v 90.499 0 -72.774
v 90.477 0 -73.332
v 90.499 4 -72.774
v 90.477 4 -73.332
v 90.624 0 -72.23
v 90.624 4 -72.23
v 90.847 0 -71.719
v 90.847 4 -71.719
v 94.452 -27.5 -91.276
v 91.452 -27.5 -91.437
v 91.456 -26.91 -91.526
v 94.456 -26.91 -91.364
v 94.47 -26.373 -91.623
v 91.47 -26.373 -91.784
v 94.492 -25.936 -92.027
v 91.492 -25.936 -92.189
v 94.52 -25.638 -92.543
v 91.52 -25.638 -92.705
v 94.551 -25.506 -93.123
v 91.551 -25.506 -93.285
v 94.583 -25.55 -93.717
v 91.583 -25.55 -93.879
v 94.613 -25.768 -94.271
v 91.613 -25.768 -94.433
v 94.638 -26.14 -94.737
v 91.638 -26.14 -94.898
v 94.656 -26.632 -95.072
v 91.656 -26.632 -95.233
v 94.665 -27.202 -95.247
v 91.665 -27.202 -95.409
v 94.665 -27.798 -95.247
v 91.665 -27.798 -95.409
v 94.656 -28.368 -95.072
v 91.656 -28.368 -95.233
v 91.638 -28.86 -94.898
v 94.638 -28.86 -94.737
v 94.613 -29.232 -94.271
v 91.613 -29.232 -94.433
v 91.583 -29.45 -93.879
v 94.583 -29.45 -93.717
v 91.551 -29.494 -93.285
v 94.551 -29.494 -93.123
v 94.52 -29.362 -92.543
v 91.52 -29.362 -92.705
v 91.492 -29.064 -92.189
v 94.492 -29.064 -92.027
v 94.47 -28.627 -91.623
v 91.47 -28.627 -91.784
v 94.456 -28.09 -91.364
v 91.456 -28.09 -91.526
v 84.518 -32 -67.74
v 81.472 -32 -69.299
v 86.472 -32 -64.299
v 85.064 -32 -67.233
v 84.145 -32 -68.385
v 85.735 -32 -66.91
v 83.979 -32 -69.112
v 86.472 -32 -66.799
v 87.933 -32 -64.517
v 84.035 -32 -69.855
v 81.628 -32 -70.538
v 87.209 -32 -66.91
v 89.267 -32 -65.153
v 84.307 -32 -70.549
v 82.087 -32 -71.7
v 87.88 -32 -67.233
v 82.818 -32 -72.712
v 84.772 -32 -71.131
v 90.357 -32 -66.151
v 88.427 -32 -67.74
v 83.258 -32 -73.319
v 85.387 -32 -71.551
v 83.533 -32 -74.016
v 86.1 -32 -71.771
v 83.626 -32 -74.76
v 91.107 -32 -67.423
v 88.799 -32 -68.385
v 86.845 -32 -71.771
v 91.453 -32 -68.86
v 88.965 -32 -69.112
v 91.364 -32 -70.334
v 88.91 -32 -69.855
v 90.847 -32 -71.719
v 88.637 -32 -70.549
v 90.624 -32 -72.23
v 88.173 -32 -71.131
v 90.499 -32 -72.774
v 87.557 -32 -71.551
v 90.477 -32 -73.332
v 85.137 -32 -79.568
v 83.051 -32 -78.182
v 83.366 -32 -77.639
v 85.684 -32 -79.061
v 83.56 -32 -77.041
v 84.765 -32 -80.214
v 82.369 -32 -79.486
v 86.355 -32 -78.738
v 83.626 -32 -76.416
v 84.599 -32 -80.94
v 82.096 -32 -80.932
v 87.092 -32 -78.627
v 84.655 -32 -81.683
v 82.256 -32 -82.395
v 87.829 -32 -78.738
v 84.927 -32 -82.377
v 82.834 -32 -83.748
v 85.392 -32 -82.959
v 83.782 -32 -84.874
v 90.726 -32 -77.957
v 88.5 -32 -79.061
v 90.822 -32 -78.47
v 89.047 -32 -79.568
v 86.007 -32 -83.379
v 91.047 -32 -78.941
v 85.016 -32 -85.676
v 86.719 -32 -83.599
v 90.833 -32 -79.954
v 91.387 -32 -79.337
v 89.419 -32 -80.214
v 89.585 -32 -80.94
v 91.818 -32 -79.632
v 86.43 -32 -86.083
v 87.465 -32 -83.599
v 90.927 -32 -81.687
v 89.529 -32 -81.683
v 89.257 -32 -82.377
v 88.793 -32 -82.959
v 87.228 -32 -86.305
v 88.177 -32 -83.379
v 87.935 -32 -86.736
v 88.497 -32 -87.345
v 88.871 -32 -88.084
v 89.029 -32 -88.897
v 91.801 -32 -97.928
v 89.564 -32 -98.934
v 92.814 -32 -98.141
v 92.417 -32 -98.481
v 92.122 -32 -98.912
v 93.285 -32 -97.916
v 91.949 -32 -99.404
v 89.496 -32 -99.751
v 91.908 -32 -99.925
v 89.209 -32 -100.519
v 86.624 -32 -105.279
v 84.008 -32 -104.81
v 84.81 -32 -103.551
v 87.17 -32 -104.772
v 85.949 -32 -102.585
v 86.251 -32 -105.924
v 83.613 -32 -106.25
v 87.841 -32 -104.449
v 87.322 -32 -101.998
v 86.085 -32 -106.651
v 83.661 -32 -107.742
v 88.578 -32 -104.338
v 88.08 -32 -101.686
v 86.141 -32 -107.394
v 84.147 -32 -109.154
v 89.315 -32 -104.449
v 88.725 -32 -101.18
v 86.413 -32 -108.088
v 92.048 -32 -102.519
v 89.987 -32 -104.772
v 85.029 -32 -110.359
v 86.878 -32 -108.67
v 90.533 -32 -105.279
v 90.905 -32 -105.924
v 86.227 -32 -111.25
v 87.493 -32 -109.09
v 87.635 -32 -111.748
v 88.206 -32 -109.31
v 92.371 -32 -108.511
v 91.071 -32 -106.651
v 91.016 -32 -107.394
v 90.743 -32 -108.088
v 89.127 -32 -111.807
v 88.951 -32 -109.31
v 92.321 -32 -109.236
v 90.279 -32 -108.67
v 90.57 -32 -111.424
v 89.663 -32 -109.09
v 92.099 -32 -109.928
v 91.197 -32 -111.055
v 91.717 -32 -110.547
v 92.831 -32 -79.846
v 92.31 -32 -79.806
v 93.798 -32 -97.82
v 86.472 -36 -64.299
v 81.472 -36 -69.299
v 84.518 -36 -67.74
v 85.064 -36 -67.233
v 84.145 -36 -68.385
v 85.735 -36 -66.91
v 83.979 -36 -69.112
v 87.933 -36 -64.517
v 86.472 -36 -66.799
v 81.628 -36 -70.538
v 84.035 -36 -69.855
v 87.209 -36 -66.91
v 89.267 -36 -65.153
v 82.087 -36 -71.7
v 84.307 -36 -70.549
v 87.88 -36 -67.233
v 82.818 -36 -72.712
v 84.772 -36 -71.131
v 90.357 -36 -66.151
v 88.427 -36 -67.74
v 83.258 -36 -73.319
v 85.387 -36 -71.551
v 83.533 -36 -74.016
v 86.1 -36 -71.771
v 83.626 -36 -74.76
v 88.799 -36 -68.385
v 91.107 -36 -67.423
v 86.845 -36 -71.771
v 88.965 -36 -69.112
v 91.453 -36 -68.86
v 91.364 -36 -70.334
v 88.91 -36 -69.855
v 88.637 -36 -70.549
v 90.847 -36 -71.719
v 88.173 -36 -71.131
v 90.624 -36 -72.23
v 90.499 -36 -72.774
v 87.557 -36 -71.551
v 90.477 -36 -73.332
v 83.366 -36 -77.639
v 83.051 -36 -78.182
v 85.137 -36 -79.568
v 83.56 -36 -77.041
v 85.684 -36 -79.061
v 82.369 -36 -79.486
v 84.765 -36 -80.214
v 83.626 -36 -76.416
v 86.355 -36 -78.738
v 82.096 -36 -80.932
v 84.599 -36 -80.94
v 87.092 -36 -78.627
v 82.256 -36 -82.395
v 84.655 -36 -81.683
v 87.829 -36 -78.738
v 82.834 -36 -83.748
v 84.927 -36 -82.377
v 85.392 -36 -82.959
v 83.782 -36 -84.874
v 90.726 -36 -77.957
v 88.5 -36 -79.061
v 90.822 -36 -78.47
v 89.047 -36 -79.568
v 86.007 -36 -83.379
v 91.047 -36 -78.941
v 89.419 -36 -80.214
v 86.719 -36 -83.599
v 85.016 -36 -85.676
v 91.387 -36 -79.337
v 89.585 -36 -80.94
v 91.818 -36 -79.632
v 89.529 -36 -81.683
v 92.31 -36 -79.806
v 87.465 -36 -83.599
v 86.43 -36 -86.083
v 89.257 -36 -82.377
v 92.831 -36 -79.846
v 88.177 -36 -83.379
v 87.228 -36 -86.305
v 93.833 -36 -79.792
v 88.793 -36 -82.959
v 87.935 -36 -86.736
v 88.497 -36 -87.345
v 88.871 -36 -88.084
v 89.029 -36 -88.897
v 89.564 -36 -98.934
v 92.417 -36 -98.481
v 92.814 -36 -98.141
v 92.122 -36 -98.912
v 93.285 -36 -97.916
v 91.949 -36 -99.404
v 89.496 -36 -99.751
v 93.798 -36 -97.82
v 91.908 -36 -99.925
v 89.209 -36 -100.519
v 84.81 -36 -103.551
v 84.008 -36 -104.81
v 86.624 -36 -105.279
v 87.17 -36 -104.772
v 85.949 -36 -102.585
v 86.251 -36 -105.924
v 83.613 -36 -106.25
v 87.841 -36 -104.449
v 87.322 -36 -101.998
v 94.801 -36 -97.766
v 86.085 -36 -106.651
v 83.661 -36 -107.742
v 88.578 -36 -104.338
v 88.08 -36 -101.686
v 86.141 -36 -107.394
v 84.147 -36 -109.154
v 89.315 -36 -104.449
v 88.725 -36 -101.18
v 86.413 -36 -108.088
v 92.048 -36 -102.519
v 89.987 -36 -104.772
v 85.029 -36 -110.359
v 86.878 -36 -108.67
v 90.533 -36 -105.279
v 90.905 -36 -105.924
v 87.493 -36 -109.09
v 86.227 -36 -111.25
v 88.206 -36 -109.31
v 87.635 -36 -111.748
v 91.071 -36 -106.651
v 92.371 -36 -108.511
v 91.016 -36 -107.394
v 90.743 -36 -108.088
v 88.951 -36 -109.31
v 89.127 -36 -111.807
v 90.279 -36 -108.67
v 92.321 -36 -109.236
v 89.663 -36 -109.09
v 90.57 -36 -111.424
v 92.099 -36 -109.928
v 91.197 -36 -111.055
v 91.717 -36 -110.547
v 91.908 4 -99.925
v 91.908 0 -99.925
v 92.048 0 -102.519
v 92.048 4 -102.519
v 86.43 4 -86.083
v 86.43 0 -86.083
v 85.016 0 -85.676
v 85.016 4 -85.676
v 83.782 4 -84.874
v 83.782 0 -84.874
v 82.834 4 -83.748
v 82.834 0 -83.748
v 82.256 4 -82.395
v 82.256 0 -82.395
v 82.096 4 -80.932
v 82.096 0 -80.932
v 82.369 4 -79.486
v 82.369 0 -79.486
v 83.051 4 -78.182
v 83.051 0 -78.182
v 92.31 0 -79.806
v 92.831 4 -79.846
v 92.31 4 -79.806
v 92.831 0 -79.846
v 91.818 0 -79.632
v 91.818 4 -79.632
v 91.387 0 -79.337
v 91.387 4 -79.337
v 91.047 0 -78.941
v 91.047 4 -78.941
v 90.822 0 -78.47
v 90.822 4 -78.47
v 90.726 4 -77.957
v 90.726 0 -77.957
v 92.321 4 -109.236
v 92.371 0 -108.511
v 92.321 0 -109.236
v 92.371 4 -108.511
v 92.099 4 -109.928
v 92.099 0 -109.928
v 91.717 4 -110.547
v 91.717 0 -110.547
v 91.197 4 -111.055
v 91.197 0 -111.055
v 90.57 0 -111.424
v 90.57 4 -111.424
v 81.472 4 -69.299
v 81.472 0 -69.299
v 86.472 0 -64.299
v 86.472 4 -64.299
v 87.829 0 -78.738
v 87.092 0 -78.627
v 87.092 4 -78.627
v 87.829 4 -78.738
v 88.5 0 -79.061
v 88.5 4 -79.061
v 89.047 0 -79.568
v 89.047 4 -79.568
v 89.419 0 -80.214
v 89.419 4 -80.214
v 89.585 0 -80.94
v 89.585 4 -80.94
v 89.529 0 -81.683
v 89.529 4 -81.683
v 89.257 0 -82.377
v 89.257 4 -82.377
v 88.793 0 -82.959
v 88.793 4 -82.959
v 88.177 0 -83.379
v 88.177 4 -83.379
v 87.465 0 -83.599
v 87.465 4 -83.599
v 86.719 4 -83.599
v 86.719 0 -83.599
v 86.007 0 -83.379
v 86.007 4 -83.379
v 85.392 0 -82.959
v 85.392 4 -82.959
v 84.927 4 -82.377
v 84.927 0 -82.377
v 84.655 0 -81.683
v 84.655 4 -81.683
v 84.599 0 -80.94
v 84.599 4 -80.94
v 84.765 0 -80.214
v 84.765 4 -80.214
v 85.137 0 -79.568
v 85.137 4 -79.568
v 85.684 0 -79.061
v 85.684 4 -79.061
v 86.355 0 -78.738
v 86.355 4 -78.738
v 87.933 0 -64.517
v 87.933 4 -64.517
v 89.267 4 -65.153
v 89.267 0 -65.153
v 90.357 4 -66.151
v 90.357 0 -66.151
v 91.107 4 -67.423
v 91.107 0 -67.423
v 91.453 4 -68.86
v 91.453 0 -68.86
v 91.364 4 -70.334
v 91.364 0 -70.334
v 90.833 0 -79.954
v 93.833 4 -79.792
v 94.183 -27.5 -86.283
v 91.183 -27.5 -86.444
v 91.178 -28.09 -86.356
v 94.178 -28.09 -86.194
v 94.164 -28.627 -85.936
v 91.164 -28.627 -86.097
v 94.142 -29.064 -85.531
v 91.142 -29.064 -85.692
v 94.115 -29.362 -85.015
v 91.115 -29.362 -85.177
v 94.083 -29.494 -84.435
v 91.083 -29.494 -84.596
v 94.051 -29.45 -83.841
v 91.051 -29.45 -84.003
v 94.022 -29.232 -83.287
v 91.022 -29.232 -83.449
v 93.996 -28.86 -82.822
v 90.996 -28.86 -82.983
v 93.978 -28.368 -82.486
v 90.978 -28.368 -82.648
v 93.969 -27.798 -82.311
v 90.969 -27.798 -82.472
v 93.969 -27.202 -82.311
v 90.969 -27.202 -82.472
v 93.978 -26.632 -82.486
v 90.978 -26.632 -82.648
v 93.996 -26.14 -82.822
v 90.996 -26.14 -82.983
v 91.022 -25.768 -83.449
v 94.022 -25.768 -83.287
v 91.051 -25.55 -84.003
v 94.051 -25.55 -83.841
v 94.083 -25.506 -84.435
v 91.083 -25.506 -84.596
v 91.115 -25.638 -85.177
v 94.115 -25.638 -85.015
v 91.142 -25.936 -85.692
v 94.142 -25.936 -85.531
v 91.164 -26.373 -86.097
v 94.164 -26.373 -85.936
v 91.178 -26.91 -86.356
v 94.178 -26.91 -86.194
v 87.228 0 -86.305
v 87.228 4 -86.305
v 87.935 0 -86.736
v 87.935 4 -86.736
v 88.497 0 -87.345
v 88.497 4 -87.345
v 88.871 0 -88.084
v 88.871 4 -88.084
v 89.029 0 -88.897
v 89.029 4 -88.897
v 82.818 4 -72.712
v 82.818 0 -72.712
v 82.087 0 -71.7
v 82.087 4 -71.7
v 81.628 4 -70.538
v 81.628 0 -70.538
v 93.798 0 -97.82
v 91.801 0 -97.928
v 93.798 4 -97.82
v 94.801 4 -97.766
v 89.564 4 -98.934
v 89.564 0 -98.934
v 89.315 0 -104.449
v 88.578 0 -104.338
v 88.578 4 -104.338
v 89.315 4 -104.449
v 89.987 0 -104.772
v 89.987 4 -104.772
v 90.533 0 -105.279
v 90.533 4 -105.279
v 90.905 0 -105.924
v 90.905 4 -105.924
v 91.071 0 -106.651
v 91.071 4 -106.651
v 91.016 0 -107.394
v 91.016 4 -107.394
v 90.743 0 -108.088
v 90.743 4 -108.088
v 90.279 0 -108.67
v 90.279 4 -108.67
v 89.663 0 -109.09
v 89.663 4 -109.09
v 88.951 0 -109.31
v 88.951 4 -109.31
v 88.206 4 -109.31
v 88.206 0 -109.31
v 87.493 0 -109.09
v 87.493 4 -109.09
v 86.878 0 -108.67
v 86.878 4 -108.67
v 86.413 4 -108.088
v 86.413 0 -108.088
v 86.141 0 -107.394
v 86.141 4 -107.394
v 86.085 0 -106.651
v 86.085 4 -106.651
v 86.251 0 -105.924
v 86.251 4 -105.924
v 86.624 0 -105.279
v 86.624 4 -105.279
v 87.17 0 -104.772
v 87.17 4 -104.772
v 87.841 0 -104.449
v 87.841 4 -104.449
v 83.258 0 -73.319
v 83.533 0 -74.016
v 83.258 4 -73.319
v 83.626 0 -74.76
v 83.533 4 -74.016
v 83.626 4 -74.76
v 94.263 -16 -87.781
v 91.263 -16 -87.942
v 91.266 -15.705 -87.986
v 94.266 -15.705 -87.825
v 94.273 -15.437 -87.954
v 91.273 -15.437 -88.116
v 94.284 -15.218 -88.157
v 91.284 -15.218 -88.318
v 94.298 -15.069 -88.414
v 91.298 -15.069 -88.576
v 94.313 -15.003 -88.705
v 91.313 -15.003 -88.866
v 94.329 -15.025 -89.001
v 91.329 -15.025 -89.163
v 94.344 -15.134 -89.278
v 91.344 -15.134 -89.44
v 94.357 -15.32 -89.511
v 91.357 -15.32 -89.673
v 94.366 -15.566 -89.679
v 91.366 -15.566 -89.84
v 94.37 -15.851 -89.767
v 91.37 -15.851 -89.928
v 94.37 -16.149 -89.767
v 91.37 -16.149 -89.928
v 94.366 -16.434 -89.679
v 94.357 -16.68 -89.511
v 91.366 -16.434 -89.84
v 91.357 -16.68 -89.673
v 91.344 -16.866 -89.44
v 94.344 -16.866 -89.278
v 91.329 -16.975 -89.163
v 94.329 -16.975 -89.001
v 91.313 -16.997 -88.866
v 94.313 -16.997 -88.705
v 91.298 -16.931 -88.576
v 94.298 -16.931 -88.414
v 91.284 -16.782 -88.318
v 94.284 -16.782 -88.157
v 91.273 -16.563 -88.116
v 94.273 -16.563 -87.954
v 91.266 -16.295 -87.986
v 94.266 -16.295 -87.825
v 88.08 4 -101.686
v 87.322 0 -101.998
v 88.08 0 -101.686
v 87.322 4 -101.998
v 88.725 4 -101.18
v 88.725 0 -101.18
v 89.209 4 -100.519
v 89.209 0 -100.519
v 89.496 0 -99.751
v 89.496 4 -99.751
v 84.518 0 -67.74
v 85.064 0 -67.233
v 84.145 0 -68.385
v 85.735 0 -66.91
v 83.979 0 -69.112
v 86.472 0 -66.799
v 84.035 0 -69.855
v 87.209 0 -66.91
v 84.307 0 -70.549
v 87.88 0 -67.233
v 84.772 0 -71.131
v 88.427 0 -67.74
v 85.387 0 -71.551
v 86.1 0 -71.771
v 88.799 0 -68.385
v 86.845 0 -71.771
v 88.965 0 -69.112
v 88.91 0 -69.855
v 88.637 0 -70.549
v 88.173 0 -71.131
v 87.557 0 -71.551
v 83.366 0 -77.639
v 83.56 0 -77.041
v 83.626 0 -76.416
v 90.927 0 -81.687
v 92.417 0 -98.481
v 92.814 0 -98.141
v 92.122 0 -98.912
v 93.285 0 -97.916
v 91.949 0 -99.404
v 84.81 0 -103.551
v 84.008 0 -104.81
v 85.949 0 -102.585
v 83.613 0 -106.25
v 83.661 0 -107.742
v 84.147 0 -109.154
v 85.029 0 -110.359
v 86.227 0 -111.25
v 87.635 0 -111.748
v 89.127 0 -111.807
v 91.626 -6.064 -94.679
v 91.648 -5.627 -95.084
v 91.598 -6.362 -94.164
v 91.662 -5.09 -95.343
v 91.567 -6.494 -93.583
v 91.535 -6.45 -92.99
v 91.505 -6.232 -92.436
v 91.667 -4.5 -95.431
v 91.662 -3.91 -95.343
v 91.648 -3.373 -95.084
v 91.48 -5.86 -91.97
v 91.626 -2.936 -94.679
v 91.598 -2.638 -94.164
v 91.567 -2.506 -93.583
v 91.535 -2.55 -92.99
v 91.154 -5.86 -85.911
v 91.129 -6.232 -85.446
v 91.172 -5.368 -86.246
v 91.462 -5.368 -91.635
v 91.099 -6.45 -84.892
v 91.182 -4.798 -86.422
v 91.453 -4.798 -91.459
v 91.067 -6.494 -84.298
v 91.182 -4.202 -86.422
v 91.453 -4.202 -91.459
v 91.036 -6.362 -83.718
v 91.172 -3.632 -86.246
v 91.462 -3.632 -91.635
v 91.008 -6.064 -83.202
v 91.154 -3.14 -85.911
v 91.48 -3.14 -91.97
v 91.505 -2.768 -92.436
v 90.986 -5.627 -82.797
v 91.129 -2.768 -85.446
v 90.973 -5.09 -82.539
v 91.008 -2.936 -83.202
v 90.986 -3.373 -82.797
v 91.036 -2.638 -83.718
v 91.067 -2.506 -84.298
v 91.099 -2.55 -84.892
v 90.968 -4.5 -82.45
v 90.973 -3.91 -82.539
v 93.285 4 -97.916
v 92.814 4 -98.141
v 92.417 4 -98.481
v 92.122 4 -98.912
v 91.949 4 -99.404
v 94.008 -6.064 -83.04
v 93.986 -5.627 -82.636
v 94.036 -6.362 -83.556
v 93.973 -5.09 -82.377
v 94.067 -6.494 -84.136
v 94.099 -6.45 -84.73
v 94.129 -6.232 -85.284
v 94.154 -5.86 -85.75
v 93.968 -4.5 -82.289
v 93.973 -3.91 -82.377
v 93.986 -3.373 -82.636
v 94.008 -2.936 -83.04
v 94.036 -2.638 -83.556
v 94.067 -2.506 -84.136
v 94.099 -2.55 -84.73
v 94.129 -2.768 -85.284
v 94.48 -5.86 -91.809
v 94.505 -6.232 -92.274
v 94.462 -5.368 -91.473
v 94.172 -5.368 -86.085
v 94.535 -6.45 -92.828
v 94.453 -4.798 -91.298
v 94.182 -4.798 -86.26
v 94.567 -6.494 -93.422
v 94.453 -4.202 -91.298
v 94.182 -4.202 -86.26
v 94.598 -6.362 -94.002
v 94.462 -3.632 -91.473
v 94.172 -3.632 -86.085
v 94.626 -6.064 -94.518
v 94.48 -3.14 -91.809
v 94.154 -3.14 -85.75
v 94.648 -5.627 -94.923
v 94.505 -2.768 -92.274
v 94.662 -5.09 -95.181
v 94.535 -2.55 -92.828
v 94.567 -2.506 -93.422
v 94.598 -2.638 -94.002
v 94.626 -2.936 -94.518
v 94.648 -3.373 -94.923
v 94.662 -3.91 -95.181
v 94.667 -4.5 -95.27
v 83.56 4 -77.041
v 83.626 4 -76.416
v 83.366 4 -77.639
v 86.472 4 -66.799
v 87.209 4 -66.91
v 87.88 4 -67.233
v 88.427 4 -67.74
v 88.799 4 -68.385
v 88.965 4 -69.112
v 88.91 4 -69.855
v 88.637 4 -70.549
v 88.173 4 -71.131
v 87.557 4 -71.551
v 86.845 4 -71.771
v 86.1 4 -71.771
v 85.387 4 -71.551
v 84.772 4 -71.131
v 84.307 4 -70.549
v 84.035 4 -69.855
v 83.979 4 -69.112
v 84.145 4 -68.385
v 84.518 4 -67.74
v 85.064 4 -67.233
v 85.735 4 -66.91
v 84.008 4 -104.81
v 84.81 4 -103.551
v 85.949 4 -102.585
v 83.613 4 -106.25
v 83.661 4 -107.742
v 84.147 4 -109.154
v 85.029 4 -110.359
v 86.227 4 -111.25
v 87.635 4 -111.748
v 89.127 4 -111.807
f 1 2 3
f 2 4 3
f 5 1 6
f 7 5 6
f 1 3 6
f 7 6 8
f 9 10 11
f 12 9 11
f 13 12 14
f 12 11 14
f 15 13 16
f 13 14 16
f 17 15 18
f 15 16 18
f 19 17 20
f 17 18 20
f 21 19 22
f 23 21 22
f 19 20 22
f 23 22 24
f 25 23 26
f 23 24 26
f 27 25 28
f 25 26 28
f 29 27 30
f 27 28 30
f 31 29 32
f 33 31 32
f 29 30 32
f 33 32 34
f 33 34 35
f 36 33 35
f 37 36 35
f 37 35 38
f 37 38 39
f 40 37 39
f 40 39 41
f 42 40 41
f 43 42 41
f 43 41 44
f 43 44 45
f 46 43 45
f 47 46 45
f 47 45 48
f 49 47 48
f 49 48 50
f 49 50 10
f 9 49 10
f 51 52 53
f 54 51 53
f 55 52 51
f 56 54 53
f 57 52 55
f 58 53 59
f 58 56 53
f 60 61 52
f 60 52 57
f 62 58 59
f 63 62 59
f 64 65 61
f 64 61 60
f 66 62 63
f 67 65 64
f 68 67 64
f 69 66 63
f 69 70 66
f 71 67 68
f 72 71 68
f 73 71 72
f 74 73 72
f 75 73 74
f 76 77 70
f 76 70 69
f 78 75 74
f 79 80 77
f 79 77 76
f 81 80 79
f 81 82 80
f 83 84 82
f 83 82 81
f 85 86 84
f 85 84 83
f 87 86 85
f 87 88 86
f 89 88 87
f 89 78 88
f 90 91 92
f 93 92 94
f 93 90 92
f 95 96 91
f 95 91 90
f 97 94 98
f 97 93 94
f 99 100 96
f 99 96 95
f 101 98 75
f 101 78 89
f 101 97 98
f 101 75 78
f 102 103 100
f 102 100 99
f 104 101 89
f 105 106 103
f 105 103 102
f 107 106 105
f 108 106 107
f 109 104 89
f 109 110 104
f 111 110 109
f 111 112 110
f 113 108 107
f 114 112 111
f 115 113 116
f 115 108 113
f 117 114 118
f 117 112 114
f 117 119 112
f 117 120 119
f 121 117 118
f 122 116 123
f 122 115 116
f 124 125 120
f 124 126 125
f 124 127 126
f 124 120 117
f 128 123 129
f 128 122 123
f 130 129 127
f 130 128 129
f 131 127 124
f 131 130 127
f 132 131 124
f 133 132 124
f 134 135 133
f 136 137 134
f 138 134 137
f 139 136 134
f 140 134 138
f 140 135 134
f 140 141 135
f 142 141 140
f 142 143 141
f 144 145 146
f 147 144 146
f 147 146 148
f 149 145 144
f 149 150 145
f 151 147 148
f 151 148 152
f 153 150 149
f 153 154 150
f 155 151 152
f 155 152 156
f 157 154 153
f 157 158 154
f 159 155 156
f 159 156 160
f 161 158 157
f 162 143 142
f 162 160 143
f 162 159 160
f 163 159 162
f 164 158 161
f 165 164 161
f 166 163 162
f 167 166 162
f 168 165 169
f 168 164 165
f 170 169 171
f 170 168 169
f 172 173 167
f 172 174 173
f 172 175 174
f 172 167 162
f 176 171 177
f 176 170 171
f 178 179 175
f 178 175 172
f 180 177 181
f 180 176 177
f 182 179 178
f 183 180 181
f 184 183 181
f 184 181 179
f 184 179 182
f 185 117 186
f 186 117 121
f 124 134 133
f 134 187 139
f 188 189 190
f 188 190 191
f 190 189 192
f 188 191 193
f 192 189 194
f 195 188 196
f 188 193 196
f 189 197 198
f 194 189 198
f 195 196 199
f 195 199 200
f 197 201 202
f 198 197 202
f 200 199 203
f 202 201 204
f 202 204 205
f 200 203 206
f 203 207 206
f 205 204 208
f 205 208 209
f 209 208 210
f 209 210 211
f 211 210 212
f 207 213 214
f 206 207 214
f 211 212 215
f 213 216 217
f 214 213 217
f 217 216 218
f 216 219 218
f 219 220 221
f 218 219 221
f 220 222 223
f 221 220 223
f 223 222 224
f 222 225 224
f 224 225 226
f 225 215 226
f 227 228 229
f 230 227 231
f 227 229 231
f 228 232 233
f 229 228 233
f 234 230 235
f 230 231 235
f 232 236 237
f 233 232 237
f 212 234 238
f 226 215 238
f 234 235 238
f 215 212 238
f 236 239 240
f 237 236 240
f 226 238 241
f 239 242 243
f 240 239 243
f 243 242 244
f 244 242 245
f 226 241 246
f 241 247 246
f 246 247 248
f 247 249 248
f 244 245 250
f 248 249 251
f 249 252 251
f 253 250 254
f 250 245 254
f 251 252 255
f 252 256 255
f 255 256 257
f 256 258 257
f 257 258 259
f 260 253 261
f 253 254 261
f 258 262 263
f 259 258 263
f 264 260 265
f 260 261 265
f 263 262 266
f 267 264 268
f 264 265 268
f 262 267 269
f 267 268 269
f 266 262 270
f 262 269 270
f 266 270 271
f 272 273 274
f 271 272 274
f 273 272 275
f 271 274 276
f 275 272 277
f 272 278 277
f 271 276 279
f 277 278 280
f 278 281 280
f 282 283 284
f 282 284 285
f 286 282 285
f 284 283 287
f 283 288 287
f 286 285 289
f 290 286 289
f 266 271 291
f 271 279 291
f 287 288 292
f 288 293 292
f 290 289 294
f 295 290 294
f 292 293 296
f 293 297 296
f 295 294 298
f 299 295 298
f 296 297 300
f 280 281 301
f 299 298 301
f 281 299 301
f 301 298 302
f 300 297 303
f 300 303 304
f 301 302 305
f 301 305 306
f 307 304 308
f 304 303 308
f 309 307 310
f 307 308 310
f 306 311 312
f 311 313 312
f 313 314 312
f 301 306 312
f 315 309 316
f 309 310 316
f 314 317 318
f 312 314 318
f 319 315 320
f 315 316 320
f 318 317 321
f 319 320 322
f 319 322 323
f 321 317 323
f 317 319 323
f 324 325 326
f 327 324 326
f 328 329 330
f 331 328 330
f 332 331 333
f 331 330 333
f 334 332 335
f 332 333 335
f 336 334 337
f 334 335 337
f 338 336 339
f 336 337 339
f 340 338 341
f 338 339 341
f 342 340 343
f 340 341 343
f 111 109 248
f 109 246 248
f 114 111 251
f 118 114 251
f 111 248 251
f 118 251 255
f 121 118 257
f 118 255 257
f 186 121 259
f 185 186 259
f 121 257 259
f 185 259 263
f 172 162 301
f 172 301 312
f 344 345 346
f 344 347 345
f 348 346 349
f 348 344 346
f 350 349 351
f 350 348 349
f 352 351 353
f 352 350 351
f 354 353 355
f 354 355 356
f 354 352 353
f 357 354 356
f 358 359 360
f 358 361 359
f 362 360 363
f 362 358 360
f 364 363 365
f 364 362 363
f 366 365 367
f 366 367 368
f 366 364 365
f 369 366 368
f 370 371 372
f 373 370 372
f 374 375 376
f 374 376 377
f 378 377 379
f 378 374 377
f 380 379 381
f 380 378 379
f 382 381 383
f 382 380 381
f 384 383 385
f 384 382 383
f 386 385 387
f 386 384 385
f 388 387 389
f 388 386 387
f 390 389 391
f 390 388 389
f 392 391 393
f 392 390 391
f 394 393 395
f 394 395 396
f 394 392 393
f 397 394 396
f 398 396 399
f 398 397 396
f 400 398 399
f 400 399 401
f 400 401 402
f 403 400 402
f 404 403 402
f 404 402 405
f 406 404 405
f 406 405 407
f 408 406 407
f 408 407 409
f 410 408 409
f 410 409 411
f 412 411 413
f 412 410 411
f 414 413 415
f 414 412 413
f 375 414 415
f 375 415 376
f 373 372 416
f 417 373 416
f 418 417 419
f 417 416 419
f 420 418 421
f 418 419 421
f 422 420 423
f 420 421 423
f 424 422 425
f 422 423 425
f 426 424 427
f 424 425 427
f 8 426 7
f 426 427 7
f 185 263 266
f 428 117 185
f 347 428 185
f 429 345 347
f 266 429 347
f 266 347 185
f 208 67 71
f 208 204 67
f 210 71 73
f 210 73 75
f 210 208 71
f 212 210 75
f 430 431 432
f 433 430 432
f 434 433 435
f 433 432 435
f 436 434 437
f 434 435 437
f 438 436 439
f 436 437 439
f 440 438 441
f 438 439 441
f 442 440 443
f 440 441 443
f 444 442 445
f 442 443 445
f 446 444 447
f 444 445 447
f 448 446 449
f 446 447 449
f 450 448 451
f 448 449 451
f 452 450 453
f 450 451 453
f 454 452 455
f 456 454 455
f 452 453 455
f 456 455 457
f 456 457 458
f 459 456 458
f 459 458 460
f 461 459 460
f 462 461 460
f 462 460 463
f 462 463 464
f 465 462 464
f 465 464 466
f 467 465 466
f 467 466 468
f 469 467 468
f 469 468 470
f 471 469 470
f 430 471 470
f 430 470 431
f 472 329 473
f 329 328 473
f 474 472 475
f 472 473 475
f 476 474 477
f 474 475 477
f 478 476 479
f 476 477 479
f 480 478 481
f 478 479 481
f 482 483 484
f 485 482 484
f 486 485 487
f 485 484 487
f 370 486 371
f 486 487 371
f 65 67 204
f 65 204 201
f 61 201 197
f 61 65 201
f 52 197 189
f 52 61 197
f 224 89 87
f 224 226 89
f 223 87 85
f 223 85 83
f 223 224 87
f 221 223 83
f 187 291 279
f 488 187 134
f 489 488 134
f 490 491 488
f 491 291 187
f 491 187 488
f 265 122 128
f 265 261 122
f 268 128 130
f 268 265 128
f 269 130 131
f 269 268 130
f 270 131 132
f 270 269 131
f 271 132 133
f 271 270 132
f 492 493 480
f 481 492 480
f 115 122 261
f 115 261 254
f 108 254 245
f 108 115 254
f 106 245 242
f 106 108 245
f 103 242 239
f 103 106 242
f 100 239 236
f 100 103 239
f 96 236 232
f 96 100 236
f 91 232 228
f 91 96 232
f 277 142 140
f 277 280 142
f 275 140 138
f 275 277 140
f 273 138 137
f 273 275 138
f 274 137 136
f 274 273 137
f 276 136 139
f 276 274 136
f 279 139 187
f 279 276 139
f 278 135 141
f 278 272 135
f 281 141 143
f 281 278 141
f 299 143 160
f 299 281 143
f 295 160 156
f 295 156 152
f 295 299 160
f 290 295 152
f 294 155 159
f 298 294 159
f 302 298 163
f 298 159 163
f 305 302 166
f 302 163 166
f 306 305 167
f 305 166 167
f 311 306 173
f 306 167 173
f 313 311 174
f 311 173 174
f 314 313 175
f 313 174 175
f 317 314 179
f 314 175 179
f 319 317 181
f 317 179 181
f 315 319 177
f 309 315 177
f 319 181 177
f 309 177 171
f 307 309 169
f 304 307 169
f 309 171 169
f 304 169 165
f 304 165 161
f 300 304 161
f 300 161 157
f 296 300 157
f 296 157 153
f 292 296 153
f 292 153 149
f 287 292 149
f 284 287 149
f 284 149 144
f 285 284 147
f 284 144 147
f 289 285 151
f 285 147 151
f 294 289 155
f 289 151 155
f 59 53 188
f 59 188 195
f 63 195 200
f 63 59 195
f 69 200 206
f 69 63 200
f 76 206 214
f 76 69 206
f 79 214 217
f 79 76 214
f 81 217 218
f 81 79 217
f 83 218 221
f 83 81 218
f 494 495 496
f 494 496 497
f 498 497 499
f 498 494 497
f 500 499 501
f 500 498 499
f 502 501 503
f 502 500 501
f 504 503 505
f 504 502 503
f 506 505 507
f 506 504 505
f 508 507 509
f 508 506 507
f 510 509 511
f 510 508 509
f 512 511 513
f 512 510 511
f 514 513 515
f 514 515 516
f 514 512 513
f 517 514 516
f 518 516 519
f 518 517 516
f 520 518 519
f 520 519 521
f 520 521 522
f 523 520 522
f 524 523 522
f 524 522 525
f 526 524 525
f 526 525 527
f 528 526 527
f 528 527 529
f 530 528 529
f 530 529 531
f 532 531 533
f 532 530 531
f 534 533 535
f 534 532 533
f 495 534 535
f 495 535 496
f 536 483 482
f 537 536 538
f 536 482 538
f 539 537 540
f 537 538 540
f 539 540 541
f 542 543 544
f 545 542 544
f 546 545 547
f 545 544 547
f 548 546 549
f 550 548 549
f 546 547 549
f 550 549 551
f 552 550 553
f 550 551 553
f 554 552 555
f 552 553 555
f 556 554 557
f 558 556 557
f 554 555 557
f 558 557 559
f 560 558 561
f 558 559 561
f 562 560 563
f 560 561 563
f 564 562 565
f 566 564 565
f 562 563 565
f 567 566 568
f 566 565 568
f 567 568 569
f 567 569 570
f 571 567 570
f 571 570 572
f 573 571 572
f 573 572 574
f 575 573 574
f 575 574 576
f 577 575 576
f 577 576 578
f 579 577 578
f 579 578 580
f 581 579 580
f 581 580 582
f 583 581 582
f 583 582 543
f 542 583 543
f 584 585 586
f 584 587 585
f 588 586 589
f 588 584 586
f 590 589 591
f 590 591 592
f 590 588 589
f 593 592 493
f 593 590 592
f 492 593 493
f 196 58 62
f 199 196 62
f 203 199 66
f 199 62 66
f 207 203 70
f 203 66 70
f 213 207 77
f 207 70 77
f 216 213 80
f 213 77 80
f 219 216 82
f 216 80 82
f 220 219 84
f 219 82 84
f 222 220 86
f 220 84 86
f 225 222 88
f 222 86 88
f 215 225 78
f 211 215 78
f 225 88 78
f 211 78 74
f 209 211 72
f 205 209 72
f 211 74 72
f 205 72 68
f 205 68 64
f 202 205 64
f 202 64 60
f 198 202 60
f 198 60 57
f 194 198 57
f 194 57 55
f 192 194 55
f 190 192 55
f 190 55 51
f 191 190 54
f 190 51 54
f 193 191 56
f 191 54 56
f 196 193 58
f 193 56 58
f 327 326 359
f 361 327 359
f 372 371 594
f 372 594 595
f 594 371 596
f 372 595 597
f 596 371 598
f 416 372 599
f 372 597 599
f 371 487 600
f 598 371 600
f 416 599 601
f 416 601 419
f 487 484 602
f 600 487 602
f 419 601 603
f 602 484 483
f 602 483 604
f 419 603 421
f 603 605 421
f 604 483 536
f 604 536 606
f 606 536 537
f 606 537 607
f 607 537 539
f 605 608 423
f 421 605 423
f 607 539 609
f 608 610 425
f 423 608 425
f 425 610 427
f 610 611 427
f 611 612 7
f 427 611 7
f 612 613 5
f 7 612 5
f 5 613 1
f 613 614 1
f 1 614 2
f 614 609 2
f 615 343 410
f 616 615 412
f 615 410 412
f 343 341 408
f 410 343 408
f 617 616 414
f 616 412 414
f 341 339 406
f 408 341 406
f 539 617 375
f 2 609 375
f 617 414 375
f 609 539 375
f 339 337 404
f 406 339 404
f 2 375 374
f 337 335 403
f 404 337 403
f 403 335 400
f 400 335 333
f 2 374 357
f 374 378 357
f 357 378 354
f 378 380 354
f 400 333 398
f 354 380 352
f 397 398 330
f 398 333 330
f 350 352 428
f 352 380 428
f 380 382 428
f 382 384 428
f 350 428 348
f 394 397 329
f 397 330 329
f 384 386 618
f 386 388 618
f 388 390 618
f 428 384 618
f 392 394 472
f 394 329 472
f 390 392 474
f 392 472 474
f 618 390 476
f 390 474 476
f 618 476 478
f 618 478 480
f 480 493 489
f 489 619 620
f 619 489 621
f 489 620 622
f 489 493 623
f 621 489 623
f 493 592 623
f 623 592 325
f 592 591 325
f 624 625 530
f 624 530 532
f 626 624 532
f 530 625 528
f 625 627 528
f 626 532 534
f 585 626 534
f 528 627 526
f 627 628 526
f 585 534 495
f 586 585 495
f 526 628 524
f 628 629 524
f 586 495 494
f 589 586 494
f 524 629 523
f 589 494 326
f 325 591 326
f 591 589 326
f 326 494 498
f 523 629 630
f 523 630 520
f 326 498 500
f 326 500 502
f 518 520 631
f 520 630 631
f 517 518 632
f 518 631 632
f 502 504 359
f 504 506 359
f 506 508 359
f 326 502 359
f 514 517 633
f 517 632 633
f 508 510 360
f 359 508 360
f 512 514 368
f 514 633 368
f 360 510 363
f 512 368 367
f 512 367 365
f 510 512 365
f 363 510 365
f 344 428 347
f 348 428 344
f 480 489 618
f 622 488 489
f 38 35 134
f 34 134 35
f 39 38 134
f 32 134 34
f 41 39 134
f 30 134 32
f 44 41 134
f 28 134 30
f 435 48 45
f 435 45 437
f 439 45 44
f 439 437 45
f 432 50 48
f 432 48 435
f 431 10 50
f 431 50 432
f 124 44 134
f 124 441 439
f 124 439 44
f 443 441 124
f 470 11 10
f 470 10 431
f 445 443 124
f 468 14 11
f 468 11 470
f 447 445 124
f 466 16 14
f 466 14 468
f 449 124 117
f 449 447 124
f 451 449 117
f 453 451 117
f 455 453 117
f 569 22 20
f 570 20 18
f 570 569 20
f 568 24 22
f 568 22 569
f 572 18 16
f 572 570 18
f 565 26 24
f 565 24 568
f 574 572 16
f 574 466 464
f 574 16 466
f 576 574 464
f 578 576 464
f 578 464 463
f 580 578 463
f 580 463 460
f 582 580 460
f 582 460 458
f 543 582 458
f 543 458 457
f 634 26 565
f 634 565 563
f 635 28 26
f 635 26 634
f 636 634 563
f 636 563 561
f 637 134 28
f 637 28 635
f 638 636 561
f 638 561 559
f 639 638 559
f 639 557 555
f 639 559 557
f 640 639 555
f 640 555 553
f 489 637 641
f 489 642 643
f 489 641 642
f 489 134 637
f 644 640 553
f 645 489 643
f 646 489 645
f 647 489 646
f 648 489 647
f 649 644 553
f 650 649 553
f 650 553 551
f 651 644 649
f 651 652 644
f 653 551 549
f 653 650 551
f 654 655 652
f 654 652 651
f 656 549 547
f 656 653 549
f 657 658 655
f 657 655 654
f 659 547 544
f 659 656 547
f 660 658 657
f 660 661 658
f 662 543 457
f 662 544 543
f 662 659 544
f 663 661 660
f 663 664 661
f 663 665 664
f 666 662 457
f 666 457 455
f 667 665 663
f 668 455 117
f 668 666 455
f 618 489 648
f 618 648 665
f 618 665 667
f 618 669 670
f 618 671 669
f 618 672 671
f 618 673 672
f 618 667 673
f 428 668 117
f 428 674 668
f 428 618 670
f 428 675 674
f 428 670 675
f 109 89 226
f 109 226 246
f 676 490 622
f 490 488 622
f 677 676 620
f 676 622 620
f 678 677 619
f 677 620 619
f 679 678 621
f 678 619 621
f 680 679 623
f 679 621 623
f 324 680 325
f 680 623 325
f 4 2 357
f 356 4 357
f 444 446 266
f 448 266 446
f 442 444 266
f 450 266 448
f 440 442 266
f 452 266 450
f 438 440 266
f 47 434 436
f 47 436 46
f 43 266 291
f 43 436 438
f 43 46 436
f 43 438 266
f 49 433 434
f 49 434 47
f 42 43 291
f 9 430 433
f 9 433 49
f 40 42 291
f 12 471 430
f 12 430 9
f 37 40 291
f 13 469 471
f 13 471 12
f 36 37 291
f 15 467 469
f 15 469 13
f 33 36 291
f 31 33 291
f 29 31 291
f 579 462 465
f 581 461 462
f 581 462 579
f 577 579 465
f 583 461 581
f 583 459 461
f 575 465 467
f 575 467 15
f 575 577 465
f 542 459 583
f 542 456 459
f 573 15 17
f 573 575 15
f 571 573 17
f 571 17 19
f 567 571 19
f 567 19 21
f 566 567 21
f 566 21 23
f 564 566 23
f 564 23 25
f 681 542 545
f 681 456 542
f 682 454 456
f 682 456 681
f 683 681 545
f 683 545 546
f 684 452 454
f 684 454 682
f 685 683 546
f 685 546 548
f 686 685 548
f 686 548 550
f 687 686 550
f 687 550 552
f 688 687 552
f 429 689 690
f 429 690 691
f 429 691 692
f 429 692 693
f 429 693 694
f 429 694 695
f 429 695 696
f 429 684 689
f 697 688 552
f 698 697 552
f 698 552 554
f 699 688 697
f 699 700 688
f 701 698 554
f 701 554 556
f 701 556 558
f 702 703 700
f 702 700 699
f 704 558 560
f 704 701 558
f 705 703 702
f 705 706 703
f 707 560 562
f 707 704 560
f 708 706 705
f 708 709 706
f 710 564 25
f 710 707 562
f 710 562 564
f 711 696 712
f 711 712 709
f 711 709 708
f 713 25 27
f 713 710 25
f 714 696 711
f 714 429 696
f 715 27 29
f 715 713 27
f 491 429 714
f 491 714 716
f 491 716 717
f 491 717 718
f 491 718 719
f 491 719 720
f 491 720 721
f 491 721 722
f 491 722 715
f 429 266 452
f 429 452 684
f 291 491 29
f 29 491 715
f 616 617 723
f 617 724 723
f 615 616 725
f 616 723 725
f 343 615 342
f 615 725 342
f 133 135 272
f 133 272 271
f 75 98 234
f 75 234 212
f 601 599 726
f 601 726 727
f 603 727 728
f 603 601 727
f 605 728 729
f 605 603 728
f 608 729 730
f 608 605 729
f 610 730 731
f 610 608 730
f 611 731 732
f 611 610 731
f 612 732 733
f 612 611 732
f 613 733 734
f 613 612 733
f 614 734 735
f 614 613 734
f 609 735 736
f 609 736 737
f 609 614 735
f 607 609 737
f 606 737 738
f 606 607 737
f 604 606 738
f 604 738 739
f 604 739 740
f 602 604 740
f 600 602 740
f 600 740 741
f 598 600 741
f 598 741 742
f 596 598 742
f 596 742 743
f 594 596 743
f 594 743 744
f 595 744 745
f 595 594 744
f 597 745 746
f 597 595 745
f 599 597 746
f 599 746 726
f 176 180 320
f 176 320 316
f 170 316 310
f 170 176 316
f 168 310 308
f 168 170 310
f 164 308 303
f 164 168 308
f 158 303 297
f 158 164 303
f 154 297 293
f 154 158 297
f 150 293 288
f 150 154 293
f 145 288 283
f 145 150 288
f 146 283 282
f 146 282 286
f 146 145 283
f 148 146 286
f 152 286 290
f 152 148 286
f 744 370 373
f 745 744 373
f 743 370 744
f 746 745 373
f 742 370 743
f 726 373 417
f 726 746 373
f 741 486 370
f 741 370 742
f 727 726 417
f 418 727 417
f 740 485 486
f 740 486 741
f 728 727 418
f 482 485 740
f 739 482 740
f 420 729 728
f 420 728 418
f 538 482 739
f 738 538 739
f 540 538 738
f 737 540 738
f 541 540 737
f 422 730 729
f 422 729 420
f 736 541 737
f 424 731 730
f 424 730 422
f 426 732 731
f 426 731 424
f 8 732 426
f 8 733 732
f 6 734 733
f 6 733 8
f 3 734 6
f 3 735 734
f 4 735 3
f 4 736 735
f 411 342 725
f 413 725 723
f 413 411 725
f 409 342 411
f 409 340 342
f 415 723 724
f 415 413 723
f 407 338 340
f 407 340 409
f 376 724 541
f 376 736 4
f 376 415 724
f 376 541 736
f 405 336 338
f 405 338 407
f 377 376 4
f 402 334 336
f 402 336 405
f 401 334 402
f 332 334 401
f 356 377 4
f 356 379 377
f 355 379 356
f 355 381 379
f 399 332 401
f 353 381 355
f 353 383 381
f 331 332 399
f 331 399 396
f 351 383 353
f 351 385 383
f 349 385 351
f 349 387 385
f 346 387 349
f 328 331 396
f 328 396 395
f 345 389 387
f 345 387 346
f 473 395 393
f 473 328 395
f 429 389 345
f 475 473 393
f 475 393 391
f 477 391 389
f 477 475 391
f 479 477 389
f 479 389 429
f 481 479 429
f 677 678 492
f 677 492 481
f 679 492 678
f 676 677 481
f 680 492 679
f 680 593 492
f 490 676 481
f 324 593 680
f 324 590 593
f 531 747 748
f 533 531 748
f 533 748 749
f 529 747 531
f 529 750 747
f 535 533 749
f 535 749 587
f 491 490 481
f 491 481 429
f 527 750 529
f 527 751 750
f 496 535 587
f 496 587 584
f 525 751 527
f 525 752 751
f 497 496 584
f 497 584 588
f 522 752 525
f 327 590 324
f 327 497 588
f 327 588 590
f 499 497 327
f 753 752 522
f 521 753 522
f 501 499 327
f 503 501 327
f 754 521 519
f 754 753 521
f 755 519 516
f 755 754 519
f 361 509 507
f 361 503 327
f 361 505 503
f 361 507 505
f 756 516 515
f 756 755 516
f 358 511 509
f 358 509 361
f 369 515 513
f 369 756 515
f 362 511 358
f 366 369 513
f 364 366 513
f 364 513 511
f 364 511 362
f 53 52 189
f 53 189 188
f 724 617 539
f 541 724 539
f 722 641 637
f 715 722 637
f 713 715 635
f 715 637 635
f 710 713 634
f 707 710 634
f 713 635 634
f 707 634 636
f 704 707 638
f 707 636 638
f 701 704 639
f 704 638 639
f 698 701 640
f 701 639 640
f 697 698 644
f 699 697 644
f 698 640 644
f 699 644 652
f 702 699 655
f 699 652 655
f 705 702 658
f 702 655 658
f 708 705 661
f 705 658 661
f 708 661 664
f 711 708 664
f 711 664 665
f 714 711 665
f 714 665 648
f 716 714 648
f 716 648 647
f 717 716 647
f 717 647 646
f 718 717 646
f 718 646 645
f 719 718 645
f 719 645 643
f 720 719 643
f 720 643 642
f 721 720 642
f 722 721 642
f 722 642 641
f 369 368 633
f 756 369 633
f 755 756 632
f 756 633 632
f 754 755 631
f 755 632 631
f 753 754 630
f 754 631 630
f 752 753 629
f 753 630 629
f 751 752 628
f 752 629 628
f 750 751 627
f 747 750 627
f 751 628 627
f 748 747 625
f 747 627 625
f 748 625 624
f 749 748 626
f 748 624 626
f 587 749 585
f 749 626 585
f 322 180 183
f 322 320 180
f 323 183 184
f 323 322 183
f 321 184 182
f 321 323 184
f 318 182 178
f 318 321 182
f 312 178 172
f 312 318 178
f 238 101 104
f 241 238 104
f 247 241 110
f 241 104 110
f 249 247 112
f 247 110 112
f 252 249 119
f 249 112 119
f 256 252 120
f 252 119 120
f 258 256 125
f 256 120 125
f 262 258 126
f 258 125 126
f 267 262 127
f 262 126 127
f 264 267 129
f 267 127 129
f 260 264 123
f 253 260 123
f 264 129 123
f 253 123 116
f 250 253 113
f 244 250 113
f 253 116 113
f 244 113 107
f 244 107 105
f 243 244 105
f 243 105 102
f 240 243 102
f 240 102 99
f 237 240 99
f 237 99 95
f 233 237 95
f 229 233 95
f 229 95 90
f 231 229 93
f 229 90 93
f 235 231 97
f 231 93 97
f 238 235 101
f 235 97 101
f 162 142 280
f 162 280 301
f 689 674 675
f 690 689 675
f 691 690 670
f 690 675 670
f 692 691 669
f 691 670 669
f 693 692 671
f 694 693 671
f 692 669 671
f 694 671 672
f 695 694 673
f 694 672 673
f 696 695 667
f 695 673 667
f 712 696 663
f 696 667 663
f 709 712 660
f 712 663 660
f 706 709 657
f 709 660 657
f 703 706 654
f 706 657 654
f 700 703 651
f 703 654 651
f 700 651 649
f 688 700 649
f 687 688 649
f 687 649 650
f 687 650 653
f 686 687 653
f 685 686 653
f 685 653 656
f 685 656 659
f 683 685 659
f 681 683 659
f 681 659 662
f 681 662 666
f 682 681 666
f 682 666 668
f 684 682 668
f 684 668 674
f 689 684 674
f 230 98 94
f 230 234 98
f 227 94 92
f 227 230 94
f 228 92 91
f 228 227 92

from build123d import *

# Parameters (mm, degrees)
SKETCH2_R           = 2.5
BOSS_EXTRUDE3_DEPTH = 4
BOSS_EXTRUDE4_DEPTH = 40
FILLET1_R           = 2
SKETCH4_R           = 2
SKETCH4_R_2         = 1
CUT_EXTRUDE1_DEPTH  = 10
FILLET3_R           = 3
FILLET4_R           = 3


with BuildPart() as part:
    # Sketch2 → Boss-Extrude3 (new body)
    with BuildSketch(Plane(origin=(0, 0, 0), x_dir=(1, 0, 0), z_dir=(0, 1, 0))):
        with BuildLine():
            ThreePointArc((83.62627208, 73.409646321), (82.043328915, 71.619198109), (81.472187529, 69.298592288))
            Line((81.472187529, 69.298592288), (86.472187529, 64.298592288))
            ThreePointArc((86.472187529, 64.298592288), (90.961711336, 67.097643404), (90.424672494, 72.360921892))
            Line((90.424672494, 72.360921892), (90.926689774, 81.686644374))
            Line((90.926689774, 81.686644374), (92.048119667, 102.518883374))
            Line((92.048119667, 102.518883374), (92.450855554, 110.000305351))
            ThreePointArc((92.450855554, 110.000305351), (83.843337657, 108.444197301), (89.726552777, 101.971283238))
            Line((89.726552777, 101.971283238), (88.863578179, 85.80252536))
            ThreePointArc((88.863578179, 85.80252536), (82.866493913, 83.799788509), (83.62627208, 77.522949199))
            Line((83.62627208, 77.522949199), (83.62627208, 73.409646321))
        make_face()
        with Locations(Location((86.472187529, 69.298592288, 0), (0, 0, 270))):
            Circle(SKETCH2_R, mode=Mode.SUBTRACT)
        with Locations(Location((87.092070964, 81.126869023, 0), (0, 0, 270))):
            Circle(SKETCH2_R, mode=Mode.SUBTRACT)
        with Locations(Location((88.578200606, 106.837625529, 0), (0, 0, 270))):
            Circle(SKETCH2_R, mode=Mode.SUBTRACT)
    boss_extrude3 = extrude(amount=BOSS_EXTRUDE3_DEPTH)

    # Sketch3 → Boss-Extrude4 (add)
    with BuildSketch(Plane(origin=(0, 4, 0), x_dir=(1, 0, 0), z_dir=(0, 1, 0))):
        Polygon((91.800965367, 97.92762227), (90.833399946, 79.953646162), (93.833399946, 79.792151774), (94.800965367, 97.766127883), align=None)
    extrude(amount=-BOSS_EXTRUDE4_DEPTH)

    # Mirror1: Boss-Extrude3 across plane
    add(boss_extrude3.mirror(Plane.ZX.offset(-16)))

    # Fillet1
    fillet1_edges = [part.edges().sort_by_distance(p)[0] for p in [
        (90.833399946, -34, -79.953646162),
        (91.800965367, -34, -97.92762227),
        (91.800965367, 2, -97.92762227),
        (90.833399946, 2, -79.953646162),
    ]]
    fillet(fillet1_edges, radius=FILLET1_R)

    # Sketch4 → Cut-Extrude1 (cut)
    with BuildSketch(Plane(origin=(86.279355648, 0, 4.6445439), x_dir=(-0.05375363451621944, 0, 0.9985542282601866), z_dir=(-0.9985542282601865, 0, -0.05375363451621943))):
        with Locations((-89.220676822, -4.5)):
            Circle(SKETCH4_R)
        with Locations(Location((-98.220676822, -4.5, 0), (0, 0, 180))):
            Circle(SKETCH4_R)
        with Locations(Location((-89.220676822, -27.5, 0), (0, 0, 180))):
            Circle(SKETCH4_R)
        with Locations((-98.220676822, -27.5)):
            Circle(SKETCH4_R)
        with Locations((-93.720676822, -16)):
            Circle(SKETCH4_R_2)
    extrude(amount=-CUT_EXTRUDE1_DEPTH, mode=Mode.SUBTRACT)

    # Fillet3
    fillet3_edges = [part.edges().sort_by_distance(p)[0] for p in [
        (92.450855554, 2, -110.000305351),
        (90.424672494, 2, -72.360921892),
        (83.62627208, 2, -73.409646321),
        (83.62627208, 2, -77.522949199),
        (89.726552777, 2, -101.971283238),
        (92.450855554, -34, -110.000305351),
        (89.726552777, -34, -101.971283238),
        (90.424672494, -34, -72.360921892),
        (83.62627208, -34, -73.409646321),
        (83.62627208, -34, -77.522949199),
    ]]
    fillet(fillet3_edges, radius=FILLET3_R)

    # Fillet4
    fillet4_edges = [part.edges().sort_by_distance(p)[0] for p in [
        (88.863578179, 2, -85.80252536),
        (88.863578179, -34, -85.80252536),
    ]]
    fillet(fillet4_edges, radius=FILLET4_R)


solid = part.part
